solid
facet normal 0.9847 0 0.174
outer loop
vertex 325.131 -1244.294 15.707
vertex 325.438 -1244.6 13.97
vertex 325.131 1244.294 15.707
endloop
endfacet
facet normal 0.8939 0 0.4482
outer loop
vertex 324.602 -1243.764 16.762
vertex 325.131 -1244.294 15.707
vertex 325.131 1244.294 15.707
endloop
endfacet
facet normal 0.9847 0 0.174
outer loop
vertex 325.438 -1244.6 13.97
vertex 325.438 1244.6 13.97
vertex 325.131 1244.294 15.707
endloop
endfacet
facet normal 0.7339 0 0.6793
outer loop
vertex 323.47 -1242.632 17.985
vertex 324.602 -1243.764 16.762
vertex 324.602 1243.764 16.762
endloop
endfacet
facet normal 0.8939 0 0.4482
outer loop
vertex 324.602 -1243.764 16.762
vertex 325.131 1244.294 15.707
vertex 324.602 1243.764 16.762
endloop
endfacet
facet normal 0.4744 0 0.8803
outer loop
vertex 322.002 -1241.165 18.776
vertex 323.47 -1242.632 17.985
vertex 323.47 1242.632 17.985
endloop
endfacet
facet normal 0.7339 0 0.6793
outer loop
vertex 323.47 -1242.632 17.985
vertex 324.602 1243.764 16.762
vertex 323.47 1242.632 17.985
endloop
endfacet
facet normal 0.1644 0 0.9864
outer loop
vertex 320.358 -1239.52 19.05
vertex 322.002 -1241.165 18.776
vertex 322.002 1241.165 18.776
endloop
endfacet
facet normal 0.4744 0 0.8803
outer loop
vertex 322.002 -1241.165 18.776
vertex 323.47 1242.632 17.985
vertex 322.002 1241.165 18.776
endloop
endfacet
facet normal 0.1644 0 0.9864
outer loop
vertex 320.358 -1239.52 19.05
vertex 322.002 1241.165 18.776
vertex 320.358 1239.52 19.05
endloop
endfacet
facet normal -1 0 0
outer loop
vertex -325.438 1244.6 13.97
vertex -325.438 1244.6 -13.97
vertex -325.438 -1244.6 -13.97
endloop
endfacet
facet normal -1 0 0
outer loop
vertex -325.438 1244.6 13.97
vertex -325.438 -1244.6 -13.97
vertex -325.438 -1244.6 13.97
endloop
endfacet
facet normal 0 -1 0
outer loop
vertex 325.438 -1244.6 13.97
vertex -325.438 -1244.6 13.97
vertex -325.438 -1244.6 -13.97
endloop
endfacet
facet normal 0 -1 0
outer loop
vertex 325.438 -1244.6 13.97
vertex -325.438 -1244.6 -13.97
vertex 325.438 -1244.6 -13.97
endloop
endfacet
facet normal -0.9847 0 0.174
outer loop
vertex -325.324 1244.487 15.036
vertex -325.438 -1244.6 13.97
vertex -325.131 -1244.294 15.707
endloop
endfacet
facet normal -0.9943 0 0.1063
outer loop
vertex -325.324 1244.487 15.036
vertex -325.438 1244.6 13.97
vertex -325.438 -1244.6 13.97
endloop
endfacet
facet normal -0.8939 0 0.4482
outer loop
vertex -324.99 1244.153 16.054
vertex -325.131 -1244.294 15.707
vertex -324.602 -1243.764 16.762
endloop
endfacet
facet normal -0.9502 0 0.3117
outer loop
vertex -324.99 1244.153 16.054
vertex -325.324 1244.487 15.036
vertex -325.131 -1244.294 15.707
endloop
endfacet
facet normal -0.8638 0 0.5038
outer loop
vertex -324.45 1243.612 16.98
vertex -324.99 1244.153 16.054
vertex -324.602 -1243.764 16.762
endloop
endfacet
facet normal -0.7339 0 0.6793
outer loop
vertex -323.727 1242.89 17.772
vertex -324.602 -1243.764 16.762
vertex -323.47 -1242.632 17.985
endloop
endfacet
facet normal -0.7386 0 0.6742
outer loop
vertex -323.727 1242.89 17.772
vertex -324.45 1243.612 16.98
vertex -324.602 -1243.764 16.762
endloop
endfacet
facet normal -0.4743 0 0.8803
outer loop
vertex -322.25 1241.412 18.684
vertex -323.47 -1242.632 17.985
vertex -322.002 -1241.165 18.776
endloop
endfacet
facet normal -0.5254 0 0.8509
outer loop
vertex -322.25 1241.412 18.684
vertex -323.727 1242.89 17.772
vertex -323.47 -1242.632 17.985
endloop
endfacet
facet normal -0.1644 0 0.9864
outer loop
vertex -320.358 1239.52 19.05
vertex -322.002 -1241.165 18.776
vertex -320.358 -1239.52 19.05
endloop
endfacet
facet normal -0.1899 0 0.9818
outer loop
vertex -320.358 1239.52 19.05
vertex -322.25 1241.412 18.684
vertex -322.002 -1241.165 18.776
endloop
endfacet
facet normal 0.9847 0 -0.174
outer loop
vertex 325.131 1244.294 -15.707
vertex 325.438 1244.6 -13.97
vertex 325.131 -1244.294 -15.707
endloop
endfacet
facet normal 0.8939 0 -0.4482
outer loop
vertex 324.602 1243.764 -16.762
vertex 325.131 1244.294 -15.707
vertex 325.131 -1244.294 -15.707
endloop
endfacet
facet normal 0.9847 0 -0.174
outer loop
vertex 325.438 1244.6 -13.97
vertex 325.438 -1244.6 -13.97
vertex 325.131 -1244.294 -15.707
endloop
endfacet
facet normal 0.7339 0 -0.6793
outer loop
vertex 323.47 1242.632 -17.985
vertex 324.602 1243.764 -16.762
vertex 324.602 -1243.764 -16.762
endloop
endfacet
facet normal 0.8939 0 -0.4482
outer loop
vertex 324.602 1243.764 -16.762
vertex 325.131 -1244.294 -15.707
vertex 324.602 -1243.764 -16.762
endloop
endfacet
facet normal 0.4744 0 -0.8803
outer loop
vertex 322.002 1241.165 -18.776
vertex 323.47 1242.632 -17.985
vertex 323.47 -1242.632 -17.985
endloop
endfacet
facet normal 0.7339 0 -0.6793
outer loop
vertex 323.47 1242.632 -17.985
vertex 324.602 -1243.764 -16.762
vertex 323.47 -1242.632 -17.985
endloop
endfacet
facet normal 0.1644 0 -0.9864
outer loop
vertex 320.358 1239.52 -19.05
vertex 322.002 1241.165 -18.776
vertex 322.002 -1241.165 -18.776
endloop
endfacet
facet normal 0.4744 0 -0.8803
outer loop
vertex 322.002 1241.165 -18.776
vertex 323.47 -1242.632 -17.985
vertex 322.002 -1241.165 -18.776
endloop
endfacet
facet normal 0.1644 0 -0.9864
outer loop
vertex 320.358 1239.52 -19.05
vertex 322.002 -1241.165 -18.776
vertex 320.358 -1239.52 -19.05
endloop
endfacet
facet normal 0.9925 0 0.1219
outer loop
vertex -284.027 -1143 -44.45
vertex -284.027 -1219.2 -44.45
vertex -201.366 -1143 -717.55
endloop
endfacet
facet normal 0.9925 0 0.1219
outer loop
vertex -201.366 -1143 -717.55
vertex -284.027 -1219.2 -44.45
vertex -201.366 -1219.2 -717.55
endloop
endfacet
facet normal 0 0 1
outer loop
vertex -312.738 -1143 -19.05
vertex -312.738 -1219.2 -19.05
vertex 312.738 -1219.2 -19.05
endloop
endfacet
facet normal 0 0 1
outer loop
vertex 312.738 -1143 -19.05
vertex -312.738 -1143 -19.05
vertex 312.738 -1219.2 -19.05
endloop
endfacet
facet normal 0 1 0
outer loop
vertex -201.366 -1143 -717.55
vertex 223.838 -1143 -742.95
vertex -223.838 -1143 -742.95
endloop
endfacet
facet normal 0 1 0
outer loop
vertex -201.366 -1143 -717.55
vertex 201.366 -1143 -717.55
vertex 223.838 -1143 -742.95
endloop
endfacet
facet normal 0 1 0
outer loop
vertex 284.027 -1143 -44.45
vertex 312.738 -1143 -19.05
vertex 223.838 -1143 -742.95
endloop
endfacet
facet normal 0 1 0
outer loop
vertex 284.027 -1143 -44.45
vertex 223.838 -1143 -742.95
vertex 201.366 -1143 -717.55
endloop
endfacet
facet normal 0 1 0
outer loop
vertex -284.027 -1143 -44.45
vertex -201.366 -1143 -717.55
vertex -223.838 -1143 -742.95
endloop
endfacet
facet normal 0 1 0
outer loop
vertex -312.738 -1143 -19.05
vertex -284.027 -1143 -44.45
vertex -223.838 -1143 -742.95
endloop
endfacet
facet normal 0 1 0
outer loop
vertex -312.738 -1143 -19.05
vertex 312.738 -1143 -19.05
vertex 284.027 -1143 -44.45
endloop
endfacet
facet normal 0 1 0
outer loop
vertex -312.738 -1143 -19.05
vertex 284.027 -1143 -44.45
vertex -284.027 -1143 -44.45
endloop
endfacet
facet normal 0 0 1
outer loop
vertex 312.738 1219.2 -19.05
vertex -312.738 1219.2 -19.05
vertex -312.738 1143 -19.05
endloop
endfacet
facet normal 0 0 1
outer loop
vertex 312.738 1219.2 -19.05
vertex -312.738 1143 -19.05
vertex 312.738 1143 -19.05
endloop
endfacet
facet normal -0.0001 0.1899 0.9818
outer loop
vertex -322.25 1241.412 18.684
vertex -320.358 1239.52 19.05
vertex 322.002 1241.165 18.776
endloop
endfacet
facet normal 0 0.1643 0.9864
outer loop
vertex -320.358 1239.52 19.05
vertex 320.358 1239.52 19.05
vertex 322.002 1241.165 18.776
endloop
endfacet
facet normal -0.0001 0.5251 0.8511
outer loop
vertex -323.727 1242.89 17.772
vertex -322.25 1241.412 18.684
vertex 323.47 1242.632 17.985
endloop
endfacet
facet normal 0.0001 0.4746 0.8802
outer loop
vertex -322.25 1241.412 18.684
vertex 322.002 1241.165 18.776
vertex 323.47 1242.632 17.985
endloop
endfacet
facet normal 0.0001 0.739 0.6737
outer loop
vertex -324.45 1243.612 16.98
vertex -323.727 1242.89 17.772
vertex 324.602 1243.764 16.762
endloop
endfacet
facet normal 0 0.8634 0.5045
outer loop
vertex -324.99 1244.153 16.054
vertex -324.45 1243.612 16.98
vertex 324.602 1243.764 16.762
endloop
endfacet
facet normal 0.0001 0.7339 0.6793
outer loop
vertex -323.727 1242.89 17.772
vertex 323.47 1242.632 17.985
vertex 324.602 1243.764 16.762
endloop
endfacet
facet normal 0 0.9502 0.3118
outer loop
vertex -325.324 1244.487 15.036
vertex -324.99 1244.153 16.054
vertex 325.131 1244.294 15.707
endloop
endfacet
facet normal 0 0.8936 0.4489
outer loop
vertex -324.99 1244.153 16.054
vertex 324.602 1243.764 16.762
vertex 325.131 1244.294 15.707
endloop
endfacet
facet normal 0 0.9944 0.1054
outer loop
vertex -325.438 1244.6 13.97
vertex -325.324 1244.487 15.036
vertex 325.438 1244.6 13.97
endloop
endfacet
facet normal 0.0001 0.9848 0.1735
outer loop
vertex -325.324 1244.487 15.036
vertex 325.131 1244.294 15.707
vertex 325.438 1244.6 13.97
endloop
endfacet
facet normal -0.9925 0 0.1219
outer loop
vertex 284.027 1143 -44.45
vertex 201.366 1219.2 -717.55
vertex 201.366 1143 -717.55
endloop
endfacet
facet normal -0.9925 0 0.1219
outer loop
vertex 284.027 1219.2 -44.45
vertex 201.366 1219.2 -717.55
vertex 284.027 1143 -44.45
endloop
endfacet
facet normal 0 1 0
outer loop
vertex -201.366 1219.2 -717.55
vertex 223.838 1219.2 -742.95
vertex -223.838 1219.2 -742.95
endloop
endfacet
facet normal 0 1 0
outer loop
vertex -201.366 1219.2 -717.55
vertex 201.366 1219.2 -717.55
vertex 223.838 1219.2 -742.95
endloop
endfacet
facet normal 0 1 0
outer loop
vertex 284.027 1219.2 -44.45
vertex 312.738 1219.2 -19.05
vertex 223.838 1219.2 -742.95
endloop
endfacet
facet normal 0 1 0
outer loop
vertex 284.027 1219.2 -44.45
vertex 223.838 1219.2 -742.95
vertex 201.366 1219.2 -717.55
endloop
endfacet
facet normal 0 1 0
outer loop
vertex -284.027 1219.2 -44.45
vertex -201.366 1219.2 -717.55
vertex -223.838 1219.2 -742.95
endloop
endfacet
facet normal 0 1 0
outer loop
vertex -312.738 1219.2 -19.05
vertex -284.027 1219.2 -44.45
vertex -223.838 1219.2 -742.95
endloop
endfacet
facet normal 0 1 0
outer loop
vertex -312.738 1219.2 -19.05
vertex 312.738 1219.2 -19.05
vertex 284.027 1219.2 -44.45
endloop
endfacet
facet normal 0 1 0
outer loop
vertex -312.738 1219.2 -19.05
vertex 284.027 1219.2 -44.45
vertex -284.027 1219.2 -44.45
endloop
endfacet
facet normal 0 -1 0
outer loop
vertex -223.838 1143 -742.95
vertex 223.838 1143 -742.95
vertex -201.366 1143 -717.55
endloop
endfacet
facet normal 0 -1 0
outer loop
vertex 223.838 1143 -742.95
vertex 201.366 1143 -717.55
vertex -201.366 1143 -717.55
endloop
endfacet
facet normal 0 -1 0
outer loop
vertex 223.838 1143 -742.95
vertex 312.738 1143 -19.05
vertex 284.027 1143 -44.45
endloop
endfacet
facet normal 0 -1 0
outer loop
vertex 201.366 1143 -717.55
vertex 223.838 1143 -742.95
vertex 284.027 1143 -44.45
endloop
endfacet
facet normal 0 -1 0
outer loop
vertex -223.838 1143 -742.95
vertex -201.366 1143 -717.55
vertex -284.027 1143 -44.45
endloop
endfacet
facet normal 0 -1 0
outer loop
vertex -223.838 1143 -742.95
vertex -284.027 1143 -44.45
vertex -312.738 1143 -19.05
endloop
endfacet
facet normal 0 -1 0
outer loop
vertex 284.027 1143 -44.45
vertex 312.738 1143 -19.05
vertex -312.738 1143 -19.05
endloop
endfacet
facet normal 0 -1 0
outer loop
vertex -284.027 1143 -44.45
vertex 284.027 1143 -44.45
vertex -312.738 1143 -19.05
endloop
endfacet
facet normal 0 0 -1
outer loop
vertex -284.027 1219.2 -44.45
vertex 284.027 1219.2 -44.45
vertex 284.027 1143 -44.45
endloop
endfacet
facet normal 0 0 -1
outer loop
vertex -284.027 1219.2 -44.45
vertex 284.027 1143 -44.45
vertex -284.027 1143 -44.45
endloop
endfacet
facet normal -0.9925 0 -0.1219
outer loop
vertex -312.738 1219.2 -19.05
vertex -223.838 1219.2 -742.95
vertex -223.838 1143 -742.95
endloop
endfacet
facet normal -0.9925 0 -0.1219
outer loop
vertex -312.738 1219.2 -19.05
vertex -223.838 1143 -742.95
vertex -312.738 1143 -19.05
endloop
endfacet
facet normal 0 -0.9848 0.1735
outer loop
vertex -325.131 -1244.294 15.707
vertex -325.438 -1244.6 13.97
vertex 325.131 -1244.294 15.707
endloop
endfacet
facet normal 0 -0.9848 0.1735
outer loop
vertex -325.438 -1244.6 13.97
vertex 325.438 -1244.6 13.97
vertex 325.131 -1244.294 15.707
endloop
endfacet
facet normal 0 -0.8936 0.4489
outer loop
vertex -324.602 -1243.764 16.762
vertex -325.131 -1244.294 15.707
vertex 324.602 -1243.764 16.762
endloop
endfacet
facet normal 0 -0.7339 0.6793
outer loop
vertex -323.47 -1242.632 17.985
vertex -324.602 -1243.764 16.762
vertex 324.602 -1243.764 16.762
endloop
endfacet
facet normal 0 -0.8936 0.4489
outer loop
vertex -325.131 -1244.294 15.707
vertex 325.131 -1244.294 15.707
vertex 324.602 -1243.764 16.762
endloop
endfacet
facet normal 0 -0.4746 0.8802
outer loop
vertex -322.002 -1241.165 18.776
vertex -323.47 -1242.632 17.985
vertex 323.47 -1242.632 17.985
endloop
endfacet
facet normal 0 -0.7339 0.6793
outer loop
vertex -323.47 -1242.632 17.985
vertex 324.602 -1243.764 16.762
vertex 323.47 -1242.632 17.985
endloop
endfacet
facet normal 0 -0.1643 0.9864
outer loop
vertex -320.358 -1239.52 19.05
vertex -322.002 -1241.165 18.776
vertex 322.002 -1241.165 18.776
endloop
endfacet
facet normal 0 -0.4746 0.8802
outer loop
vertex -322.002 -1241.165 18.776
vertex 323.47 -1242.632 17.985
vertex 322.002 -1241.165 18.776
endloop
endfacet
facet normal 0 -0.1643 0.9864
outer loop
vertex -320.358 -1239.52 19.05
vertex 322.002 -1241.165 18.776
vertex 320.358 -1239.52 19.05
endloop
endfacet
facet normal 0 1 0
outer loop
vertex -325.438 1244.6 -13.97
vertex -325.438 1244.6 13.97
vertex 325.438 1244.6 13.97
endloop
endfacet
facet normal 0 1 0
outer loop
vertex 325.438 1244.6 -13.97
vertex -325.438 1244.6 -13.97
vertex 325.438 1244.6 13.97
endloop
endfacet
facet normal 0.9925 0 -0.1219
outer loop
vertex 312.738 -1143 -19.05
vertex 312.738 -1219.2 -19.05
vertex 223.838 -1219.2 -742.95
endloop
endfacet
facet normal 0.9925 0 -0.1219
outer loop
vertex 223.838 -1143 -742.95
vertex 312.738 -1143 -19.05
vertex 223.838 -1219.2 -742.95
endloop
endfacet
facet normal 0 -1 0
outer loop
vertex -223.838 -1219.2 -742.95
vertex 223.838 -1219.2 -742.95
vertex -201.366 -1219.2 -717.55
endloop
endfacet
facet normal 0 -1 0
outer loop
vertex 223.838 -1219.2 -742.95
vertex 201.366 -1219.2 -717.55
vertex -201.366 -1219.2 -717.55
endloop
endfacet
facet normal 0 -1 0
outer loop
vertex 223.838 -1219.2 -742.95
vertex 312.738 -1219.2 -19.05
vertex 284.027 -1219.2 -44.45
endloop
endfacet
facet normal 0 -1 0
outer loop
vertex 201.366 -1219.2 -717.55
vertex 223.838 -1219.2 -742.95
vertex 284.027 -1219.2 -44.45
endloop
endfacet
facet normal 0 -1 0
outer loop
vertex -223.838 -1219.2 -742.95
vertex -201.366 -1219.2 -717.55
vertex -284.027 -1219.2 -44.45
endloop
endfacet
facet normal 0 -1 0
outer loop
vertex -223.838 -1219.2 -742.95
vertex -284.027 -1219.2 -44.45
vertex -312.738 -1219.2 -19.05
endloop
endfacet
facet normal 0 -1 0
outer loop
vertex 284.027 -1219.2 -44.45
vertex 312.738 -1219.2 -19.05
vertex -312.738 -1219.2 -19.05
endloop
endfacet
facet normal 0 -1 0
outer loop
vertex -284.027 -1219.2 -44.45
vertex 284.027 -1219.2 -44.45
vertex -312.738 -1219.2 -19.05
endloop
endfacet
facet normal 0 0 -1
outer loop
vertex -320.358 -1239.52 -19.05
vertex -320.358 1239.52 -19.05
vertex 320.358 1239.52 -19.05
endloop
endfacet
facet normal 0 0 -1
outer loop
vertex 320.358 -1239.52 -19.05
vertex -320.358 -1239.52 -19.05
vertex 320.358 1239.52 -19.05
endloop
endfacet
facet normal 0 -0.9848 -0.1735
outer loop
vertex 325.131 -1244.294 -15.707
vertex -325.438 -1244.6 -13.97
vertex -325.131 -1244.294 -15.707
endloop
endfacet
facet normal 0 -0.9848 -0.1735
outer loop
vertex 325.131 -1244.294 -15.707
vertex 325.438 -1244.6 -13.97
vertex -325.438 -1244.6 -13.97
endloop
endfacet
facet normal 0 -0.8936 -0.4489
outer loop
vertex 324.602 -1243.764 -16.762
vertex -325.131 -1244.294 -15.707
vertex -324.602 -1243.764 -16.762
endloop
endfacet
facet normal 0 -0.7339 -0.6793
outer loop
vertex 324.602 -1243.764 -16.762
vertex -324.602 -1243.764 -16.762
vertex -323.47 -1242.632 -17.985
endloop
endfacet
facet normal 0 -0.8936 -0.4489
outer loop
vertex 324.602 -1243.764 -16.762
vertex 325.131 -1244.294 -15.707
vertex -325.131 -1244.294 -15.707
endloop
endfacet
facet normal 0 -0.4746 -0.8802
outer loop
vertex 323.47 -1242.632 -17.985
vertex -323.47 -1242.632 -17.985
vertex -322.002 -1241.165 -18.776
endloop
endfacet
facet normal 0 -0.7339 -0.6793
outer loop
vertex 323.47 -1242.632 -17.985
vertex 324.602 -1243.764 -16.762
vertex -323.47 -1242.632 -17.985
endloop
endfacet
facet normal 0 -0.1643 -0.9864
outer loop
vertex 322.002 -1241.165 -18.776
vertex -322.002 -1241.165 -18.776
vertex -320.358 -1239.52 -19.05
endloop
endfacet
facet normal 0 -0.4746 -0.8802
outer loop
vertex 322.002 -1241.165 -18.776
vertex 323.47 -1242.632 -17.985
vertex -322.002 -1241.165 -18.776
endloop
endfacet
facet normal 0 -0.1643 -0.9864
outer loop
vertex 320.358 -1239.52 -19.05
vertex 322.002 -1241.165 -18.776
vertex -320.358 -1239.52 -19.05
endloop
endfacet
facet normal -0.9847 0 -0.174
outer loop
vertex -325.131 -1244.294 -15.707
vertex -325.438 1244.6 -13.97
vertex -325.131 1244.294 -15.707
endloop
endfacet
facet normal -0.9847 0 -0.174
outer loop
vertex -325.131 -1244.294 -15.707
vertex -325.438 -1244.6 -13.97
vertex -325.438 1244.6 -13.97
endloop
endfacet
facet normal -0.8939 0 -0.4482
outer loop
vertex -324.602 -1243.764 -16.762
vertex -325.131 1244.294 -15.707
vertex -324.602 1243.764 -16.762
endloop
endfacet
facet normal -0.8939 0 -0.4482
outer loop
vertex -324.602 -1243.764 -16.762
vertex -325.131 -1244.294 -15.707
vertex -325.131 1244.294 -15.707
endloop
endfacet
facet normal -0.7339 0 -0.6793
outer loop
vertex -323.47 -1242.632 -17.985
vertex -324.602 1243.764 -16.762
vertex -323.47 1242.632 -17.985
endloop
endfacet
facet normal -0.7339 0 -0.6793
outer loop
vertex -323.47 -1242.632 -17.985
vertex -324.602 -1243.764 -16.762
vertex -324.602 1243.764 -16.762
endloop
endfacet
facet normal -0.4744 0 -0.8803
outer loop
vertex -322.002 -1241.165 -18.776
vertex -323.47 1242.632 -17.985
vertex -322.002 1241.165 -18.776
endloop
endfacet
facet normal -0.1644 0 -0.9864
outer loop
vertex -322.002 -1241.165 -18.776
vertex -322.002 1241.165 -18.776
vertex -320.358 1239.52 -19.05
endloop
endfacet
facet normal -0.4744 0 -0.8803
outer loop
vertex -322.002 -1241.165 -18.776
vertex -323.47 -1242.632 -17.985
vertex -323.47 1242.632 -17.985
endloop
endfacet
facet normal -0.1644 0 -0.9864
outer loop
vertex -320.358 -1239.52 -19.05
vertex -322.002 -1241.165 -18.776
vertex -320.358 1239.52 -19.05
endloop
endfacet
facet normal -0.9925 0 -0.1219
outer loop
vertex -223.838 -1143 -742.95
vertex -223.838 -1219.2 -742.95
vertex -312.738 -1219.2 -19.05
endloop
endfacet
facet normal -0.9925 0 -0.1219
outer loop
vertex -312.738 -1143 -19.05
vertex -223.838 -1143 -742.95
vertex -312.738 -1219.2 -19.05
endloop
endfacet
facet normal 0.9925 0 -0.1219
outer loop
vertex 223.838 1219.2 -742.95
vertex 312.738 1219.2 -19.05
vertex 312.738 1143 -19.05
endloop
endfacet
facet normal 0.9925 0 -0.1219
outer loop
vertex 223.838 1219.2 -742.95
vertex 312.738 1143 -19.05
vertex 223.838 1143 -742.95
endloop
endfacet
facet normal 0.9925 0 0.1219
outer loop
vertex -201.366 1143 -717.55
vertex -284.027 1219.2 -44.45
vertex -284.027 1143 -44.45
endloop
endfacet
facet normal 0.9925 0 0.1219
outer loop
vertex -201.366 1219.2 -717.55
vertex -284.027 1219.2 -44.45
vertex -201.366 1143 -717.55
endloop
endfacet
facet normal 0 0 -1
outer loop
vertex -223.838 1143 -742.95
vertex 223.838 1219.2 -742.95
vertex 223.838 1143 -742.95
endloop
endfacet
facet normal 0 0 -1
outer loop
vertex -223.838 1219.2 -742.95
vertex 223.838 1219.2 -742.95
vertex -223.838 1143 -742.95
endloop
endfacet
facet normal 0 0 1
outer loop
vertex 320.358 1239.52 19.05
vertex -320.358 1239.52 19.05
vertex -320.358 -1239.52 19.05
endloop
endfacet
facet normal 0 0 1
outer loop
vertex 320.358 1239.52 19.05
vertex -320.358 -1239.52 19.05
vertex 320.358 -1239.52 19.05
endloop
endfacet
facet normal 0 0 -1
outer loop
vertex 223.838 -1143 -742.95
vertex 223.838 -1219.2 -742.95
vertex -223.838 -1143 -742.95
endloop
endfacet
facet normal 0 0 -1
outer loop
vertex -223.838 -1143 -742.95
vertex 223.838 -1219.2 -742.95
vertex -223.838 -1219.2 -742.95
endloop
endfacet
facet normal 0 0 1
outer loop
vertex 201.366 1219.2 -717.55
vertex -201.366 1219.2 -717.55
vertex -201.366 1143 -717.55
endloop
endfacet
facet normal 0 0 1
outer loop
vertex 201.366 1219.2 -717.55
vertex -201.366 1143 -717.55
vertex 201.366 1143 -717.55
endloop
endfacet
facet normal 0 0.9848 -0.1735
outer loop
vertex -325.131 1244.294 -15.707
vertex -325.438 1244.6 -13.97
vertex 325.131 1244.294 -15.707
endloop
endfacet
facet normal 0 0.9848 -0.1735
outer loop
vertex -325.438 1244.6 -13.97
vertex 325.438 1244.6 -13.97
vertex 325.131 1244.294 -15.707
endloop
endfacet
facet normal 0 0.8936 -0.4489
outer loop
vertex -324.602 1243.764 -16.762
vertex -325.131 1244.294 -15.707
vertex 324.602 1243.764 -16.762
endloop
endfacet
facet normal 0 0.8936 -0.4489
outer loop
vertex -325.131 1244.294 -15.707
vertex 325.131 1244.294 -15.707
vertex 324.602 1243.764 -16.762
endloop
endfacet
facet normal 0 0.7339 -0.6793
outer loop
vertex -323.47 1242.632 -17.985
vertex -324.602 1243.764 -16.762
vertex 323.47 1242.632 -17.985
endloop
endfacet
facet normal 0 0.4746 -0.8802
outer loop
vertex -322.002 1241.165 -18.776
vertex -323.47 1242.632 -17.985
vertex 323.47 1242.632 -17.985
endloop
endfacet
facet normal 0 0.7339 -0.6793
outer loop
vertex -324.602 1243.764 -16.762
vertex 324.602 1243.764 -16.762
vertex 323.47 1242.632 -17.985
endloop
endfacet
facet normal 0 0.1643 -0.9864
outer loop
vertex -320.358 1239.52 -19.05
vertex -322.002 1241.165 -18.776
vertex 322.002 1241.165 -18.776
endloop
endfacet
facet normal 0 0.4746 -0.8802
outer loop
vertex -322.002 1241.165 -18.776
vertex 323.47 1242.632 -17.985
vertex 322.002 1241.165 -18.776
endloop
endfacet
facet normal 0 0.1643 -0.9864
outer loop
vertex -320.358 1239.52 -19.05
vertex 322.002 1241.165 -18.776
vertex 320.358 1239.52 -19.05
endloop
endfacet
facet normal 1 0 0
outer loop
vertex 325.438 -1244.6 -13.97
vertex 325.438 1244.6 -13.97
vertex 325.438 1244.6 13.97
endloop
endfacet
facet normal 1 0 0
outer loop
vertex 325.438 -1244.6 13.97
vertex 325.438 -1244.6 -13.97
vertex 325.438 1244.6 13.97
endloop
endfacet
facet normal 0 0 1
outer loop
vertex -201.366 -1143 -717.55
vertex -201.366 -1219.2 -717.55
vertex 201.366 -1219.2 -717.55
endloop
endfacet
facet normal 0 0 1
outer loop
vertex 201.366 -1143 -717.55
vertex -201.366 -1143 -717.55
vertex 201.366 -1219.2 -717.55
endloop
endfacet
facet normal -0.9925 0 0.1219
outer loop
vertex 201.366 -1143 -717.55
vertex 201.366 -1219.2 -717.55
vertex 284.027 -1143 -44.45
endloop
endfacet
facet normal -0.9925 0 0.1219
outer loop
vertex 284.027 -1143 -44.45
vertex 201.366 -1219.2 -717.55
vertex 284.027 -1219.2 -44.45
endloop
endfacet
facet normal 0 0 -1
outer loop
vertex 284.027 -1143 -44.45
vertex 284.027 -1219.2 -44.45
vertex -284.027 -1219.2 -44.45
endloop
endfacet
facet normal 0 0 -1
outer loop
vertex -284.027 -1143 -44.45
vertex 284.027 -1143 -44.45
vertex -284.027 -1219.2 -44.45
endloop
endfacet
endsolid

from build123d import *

# Parameters (mm, degrees)
F0_W     = 650.875
F0_H     = 38.1
F1_DEPTH = 1244.6
F2_R     = 5.08
F5_DEPTH = 76.2


with BuildPart() as f1:
    # F0 (on Front) → F1 (new body, symmetric)
    with BuildSketch(Plane.XZ):
        Rectangle(F0_W, F0_H)
    extrude(amount=F1_DEPTH, both=True)

    # F2
    f2_edges = [f1.edges().sort_by_distance(p)[0] for p in [
        (325.4375, 0, 19.05),
        (0, 1244.6, 19.05),
        (-325.4375, 0, 19.05),
        (0, -1244.6, 19.05),
        (0, 1244.6, -19.05),
        (325.4375, 0, -19.05),
        (0, -1244.6, -19.05),
        (-325.4375, 0, -19.05),
    ]]
    fillet(f2_edges, radius=F2_R)


with BuildPart() as f5:
    # F4 (on offset) → F5 (new body)
    with BuildSketch(Plane(origin=(0, 1219.2, 0), x_dir=(-1, 0, 0), z_dir=(0, 1, 0))):
        Polygon((312.7375, -19.05), (0, -19.05), (-312.7375, -19.05), (-223.8375, -742.95), (0, -742.95), (223.8375, -742.95), align=None)
        Polygon((-284.0273826674, -44.45), (0, -44.45), (284.0273826674, -44.45), (201.3659791586, -717.55), (0, -717.55), (-201.3659791586, -717.55), align=None, mode=Mode.SUBTRACT)
    extrude(amount=-F5_DEPTH)


with BuildPart() as f6_1:
    # F6: instance of F5
    add(f5.part.mirror(Plane.XZ))


solid = Compound([f1.part, f5.part, f6_1.part])
